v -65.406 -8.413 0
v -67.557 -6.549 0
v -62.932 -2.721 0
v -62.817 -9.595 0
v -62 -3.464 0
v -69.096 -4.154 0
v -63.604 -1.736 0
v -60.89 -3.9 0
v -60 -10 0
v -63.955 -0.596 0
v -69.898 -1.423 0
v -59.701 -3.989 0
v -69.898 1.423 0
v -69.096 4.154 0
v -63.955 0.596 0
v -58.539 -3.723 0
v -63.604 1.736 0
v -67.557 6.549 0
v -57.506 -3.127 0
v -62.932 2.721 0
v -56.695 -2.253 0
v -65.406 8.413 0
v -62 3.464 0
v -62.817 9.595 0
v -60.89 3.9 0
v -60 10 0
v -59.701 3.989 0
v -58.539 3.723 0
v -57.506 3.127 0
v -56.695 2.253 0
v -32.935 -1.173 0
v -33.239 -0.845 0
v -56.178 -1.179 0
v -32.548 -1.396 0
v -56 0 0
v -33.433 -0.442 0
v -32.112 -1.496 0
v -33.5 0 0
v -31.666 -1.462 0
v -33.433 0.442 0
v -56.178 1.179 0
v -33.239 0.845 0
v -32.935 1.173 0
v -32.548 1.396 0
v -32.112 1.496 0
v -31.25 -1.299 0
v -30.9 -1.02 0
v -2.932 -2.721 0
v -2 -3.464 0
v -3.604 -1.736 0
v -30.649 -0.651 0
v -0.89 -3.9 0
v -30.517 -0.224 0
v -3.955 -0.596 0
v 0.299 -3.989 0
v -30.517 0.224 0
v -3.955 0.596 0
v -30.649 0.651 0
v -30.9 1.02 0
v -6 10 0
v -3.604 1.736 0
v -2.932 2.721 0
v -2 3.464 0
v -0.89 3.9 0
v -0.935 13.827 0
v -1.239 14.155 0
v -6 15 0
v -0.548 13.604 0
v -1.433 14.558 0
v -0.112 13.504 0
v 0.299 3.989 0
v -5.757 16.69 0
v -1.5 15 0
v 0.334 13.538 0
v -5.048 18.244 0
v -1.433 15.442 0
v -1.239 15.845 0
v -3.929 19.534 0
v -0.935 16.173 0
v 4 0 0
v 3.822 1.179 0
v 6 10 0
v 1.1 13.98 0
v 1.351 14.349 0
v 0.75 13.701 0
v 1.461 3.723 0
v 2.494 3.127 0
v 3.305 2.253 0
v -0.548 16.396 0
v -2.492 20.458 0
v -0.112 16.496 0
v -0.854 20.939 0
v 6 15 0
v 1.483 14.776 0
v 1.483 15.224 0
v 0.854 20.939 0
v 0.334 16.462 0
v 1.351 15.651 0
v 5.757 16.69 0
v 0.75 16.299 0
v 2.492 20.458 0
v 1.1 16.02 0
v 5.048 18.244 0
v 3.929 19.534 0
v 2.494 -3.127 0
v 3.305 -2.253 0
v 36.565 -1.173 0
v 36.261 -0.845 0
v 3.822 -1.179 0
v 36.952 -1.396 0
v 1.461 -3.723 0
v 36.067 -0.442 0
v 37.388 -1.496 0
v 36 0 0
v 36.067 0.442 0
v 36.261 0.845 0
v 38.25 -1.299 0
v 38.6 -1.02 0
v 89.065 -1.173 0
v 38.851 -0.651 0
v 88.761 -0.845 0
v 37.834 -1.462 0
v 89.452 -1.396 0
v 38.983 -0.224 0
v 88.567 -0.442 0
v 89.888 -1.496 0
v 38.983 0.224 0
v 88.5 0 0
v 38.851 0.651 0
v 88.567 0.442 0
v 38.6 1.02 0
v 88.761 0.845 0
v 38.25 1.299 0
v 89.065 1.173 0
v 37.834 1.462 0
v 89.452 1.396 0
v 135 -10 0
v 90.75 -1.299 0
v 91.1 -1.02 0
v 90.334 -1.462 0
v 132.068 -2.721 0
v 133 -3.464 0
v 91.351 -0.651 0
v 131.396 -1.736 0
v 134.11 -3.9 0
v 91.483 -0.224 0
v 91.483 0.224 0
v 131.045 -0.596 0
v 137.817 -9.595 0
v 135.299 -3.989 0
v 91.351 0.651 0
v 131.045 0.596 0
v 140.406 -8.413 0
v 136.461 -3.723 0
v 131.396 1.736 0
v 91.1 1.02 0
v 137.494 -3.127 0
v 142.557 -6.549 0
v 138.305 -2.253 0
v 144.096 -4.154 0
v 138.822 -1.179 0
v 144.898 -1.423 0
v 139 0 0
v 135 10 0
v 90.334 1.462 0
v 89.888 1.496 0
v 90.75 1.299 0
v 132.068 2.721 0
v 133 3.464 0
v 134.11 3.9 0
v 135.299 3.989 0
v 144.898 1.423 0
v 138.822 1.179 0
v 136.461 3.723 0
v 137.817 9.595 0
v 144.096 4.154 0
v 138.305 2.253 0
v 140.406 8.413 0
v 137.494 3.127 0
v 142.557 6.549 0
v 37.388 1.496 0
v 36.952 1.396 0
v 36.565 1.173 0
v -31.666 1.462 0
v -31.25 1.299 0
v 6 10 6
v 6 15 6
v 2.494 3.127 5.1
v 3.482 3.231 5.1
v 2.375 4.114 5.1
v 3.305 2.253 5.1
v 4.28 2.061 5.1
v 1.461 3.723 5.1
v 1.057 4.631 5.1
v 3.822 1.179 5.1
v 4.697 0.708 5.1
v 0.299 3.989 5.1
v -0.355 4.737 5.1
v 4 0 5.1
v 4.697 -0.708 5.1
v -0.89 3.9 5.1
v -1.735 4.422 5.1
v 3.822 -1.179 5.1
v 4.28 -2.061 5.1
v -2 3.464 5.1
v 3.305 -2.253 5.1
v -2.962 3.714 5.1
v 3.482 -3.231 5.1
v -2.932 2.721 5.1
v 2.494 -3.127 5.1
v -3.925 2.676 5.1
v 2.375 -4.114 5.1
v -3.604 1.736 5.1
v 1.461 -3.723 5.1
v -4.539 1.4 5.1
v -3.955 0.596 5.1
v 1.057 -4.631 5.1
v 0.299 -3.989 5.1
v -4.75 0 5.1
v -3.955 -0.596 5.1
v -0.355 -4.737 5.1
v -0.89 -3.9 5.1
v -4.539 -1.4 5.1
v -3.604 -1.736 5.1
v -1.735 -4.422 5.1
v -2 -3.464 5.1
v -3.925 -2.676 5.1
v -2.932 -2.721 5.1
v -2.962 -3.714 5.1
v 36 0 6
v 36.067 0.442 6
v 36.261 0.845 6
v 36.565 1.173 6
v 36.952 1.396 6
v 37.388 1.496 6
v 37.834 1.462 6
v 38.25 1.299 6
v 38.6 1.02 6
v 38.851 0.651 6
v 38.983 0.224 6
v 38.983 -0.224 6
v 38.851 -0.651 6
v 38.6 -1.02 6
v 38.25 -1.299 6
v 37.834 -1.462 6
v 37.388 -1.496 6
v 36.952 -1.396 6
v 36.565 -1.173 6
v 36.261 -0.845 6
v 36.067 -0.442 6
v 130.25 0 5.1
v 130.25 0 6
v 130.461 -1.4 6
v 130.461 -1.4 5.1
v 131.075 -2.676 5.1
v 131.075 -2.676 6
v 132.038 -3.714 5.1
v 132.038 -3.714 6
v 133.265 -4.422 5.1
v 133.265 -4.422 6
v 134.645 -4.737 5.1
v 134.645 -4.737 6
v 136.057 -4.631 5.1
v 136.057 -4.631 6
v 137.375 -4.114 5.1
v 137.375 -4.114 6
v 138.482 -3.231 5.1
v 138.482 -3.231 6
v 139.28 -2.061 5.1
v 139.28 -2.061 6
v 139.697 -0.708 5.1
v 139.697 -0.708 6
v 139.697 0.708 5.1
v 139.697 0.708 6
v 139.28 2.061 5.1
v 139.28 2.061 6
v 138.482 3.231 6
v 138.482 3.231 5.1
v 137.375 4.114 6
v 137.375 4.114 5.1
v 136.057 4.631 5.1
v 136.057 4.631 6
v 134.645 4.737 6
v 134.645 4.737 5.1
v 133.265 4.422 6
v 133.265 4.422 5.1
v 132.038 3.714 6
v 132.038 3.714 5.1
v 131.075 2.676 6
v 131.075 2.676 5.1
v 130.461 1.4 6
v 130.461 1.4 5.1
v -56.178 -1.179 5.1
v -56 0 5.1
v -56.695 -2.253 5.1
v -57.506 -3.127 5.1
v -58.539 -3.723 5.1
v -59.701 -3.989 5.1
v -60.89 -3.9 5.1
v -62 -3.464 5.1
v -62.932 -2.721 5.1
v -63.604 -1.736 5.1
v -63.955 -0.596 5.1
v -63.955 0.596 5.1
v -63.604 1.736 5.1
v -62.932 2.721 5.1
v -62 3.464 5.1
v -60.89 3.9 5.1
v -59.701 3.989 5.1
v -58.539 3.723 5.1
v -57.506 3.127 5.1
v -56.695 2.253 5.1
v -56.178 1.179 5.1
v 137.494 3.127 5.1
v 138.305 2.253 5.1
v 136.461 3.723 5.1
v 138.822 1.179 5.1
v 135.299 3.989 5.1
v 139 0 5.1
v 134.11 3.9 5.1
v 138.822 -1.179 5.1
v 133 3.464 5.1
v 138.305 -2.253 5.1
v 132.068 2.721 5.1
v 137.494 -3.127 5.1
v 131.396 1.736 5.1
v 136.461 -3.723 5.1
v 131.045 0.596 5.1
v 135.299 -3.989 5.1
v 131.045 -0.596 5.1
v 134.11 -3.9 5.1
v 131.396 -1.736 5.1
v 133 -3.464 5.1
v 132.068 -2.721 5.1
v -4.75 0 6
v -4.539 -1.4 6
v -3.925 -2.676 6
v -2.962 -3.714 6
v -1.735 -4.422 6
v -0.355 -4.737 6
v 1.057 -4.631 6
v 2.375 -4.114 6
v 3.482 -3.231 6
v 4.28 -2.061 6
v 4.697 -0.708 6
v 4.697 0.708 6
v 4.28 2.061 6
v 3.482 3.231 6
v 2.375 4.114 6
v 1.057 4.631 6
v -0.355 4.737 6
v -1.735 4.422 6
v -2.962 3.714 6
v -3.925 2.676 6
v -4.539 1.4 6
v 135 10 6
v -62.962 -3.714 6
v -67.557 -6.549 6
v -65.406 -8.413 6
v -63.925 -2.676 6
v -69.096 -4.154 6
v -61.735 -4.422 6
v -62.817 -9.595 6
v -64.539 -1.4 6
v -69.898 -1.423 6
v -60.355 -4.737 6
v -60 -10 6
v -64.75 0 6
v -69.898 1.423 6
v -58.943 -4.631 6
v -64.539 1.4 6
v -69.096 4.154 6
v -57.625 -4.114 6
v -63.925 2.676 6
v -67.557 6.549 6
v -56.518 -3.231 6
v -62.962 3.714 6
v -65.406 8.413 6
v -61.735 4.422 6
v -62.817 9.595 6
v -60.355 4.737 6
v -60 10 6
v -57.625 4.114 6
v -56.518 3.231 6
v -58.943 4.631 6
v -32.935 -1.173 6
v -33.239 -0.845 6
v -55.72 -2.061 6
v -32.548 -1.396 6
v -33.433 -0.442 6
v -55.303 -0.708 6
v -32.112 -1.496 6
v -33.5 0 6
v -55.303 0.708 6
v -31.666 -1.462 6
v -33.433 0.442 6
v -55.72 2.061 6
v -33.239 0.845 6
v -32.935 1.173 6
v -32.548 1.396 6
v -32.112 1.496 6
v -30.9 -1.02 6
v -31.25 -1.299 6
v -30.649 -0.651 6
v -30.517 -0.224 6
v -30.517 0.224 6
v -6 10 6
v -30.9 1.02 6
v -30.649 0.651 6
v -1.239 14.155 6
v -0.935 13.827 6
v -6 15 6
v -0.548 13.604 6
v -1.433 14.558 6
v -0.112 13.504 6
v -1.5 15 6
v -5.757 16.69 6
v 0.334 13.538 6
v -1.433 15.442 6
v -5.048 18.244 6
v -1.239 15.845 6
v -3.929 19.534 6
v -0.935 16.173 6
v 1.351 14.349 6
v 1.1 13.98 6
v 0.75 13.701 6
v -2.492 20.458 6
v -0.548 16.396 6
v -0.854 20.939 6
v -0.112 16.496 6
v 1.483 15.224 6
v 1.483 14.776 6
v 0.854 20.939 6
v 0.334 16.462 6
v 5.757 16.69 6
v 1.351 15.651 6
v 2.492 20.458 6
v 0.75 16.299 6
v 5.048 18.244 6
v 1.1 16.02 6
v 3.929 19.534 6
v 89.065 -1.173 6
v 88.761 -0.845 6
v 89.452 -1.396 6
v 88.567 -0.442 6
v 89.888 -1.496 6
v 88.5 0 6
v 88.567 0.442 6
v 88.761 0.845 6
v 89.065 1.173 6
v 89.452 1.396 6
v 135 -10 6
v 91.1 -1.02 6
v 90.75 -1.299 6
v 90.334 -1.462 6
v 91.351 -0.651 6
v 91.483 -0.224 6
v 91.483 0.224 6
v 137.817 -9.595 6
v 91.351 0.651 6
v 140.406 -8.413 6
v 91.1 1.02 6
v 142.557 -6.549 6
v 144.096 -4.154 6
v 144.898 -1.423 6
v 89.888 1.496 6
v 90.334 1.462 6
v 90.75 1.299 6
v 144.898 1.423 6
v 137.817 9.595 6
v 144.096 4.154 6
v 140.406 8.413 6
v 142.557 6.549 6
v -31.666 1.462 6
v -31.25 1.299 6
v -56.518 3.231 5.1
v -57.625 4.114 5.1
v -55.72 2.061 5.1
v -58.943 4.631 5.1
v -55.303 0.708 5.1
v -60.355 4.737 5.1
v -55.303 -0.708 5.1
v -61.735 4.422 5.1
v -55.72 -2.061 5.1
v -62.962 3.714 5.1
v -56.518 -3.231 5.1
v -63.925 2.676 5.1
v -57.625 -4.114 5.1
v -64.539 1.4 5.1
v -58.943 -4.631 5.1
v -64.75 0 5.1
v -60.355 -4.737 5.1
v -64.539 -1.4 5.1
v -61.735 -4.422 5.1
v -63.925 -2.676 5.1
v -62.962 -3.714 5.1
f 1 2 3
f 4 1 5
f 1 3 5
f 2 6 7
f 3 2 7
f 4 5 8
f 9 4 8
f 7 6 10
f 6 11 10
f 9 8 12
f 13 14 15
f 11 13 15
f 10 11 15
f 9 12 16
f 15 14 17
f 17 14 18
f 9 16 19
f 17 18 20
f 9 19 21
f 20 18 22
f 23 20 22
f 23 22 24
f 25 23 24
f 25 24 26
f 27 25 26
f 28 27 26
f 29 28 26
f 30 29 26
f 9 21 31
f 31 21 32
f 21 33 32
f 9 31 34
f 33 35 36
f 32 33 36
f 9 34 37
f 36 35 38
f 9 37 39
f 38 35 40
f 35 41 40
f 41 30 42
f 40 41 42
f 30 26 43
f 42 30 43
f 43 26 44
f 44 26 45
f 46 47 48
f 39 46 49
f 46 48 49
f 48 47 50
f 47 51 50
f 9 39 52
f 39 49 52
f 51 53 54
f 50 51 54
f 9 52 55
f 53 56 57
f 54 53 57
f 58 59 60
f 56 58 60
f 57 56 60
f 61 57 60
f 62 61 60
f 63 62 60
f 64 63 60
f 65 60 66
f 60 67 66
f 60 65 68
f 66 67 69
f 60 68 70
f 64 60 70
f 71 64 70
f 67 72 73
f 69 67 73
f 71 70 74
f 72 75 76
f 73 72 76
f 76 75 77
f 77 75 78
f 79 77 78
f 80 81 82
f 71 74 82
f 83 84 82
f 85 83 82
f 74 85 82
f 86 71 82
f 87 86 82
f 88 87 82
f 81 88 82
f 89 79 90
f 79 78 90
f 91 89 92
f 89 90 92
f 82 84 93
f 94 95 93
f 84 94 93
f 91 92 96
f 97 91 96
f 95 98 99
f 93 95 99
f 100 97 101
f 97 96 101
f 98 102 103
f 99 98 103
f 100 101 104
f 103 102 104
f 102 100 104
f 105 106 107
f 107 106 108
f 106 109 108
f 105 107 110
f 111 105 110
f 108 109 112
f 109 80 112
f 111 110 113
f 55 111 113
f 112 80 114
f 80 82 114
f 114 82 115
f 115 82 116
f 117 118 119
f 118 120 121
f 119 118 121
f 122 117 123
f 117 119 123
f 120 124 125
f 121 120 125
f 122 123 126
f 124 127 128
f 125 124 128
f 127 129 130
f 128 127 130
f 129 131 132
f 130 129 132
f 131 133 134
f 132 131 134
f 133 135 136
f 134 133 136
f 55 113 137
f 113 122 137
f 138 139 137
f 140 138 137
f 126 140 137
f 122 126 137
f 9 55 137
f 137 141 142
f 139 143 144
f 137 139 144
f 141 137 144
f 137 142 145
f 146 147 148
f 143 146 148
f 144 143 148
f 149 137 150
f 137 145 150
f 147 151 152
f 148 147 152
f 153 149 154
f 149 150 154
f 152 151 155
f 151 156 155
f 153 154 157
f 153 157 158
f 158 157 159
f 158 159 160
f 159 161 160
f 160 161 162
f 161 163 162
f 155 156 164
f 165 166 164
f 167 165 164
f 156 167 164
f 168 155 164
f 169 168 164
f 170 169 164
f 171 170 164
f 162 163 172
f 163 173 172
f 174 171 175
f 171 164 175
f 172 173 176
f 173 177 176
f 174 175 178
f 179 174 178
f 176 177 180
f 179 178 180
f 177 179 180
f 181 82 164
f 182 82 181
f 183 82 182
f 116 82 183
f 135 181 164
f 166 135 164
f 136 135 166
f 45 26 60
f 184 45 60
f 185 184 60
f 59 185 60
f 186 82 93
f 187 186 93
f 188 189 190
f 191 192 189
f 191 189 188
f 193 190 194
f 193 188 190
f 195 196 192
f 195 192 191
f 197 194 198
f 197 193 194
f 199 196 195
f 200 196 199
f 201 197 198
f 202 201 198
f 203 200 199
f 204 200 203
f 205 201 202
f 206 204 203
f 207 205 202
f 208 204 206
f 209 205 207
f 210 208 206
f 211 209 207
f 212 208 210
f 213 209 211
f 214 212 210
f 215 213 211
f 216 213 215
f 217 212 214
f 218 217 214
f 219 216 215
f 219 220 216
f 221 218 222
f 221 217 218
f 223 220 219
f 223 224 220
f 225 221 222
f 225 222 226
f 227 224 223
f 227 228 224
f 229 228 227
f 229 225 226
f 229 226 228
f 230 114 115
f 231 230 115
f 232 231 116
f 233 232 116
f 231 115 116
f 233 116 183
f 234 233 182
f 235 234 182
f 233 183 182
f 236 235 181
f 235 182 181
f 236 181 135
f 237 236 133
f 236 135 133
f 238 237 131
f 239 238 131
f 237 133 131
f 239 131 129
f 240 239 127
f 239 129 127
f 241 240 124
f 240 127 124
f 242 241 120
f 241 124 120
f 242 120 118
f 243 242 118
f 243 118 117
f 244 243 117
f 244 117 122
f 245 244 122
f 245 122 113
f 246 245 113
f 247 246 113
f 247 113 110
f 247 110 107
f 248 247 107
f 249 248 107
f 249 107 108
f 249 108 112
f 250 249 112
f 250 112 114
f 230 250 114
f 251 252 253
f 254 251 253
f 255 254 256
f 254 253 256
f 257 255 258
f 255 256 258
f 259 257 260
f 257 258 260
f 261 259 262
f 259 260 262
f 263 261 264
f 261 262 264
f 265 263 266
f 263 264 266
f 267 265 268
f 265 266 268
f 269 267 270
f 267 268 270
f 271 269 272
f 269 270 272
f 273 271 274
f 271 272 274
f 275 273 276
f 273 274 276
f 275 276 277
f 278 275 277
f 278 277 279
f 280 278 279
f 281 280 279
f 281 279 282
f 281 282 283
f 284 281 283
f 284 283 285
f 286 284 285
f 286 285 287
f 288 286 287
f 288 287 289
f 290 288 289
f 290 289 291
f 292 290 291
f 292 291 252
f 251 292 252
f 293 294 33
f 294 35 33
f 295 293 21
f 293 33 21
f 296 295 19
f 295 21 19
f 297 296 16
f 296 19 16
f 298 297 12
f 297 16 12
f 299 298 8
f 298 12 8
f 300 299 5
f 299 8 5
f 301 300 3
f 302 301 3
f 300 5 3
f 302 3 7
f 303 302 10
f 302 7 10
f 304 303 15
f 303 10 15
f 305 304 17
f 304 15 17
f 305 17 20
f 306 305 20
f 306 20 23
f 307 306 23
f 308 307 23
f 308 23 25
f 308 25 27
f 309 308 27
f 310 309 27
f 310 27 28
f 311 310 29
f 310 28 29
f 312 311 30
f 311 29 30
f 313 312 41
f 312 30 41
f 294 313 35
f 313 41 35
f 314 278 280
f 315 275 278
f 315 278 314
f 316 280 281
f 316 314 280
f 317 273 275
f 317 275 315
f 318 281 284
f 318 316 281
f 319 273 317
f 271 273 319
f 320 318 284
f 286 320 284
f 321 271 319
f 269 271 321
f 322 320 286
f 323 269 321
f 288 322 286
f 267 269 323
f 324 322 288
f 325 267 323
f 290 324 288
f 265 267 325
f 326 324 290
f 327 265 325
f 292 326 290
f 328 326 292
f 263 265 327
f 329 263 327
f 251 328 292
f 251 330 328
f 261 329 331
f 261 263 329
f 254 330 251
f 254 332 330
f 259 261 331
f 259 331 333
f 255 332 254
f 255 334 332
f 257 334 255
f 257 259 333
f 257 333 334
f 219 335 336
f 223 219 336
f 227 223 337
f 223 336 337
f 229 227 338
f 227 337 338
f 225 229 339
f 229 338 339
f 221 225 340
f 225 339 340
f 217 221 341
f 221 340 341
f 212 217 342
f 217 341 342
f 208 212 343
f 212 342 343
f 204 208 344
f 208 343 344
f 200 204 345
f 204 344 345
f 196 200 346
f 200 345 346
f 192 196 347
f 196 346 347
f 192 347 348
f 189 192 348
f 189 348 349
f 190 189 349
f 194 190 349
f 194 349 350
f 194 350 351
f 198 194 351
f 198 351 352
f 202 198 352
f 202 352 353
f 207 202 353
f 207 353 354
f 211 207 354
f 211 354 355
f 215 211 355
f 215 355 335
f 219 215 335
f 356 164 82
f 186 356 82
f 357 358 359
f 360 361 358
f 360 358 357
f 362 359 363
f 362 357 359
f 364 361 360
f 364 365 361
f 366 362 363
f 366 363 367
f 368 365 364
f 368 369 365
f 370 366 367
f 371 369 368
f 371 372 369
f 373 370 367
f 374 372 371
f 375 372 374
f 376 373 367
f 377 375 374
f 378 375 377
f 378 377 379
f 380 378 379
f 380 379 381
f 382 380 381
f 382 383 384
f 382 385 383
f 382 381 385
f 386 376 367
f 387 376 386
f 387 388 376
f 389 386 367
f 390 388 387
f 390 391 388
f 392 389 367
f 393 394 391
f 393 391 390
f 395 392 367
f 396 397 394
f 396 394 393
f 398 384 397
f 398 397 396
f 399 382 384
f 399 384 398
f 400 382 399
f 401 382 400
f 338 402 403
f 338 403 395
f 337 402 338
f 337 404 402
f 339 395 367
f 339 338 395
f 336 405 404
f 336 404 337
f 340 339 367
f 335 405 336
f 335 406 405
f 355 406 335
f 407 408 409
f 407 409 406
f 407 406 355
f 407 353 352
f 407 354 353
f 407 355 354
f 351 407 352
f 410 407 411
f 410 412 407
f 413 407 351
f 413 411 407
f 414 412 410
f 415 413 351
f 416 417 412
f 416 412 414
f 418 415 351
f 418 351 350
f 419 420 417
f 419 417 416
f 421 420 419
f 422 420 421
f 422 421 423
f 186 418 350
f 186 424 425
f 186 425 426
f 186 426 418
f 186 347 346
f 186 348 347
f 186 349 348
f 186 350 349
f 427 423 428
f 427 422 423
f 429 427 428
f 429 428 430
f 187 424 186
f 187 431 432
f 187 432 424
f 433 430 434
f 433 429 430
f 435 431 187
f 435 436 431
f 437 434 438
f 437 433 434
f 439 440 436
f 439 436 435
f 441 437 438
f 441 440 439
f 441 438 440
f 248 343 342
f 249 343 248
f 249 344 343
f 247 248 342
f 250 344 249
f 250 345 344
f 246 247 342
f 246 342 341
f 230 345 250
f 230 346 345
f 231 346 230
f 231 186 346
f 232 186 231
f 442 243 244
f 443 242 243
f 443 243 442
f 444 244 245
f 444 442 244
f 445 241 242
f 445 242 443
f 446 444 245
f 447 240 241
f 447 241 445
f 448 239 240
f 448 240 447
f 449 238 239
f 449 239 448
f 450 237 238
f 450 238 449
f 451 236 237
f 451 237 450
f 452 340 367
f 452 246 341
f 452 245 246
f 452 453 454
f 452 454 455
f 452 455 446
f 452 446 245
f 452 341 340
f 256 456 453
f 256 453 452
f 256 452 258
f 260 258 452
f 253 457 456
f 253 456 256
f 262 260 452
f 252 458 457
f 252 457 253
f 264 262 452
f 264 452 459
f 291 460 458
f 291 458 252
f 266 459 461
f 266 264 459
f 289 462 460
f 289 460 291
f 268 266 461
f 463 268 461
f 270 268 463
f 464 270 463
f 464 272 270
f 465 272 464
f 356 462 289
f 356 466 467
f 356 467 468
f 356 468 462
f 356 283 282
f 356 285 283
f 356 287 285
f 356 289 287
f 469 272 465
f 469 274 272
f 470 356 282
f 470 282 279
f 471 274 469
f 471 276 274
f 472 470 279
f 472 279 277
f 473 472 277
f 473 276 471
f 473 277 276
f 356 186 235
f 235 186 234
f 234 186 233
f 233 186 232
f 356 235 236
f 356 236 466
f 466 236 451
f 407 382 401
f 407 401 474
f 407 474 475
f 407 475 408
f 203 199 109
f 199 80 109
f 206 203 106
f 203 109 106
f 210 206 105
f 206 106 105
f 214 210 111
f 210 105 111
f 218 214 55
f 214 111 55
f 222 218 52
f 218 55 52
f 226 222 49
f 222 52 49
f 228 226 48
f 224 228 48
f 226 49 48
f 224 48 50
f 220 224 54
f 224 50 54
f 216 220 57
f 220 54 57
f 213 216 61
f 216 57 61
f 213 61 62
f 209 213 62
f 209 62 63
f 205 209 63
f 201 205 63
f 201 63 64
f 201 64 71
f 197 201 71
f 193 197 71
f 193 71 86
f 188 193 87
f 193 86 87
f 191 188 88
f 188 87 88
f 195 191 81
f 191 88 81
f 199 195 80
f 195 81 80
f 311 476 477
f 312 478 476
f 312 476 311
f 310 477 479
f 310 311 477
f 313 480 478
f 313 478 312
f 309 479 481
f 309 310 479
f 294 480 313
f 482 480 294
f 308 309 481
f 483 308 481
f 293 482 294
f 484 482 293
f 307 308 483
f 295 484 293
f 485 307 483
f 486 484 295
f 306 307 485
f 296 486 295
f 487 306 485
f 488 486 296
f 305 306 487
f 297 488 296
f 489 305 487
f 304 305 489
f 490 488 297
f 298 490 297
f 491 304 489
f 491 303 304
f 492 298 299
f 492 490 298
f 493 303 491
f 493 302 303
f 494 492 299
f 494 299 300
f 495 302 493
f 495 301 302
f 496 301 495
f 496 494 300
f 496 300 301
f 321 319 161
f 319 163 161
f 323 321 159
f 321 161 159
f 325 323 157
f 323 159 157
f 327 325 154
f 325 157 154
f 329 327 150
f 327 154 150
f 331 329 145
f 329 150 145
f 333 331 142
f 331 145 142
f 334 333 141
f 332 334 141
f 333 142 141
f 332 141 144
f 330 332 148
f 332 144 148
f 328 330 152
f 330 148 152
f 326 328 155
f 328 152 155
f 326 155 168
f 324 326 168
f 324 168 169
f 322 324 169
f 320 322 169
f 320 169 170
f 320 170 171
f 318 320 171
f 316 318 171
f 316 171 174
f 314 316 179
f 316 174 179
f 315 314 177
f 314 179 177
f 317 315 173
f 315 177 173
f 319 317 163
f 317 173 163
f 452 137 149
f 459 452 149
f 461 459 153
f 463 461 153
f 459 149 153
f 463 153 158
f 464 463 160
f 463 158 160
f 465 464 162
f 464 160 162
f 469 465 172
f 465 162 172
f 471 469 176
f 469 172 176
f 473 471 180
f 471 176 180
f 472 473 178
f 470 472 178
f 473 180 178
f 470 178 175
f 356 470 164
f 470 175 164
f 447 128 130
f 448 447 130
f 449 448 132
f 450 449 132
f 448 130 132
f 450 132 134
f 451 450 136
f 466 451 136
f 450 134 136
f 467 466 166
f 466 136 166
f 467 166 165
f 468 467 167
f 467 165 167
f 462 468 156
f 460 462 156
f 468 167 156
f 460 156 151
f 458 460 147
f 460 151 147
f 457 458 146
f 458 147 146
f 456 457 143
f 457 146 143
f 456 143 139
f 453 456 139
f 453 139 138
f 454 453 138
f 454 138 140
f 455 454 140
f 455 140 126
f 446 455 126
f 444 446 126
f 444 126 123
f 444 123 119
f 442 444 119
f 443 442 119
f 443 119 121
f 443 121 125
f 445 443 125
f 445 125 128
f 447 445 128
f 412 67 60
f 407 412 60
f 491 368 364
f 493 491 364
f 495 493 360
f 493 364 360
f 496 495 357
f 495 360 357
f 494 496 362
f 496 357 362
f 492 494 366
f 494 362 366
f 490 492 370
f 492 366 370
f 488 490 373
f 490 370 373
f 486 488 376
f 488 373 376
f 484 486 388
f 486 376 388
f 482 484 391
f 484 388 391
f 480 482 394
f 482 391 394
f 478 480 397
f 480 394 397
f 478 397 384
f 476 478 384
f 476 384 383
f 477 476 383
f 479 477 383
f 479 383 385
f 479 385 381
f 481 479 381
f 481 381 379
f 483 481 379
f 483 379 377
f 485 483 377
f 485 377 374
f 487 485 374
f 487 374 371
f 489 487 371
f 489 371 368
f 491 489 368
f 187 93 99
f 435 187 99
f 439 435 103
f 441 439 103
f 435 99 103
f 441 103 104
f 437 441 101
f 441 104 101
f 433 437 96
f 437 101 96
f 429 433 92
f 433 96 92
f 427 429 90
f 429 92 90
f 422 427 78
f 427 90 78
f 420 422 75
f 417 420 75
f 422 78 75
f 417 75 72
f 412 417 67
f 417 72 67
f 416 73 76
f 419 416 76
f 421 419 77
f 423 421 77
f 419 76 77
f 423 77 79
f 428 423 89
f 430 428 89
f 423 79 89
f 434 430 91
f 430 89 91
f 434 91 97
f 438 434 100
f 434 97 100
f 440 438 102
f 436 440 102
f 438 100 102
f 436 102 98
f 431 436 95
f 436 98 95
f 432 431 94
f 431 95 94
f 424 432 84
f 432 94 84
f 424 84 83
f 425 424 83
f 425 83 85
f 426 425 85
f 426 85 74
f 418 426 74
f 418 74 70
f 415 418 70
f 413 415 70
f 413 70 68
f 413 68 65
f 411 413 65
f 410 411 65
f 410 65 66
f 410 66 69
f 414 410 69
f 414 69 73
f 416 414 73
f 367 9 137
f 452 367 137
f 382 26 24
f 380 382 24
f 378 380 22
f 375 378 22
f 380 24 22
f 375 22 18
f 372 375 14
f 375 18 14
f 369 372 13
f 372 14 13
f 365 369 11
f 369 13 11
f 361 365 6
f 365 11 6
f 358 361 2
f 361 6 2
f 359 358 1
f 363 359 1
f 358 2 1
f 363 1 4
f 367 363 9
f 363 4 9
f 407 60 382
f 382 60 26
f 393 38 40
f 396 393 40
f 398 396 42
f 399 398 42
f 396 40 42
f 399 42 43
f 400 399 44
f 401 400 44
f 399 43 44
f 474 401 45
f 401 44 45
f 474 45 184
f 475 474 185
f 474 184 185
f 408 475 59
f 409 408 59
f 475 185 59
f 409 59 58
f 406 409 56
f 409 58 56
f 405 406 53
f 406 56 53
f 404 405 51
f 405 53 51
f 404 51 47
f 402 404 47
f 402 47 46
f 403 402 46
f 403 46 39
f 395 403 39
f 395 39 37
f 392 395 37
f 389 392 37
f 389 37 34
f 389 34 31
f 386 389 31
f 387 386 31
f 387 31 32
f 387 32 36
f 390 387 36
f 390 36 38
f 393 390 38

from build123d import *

# Parameters (mm, degrees)
EXTRUDE_1_DEPTH              = 6
HOLE_WIZARD_M5_1_D           = 8
HOLE_WIZARD_M5_1_CBORE_D     = 9.5
HOLE_WIZARD_M5_1_CBORE_DEPTH = 0.9
SKETCH_7_R                   = 1.5
CUT_EXTRUDE_1_DEPTH          = 1
CUT_EXTRUDE_1_DEPTH_BACK     = 7


with BuildPart() as part:
    # 草图1 → 凸台-拉伸1 (new body)
    with BuildSketch(Plane.XY):
        with BuildLine():
            Line((-60, -10), (135, -10))
            ThreePointArc((135, -10), (145, 0), (135, 10))
            Line((135, 10), (6, 10))
            Line((6, 10), (6, 15))
            ThreePointArc((6, 15), (0, 21), (-6, 15))
            Line((-6, 15), (-6, 10))
            Line((-6, 10), (-60, 10))
            ThreePointArc((-60, 10), (-70, 0), (-60, -10))
        make_face()
    extrude(amount=EXTRUDE_1_DEPTH)

    # M5 六角头螺栓的柱形沉头孔1 (through all)
    with Locations(Plane(origin=(0, 0, 6), x_dir=(-1, 0, 0), z_dir=(0, 0, 1))):
        with Locations((-135, 0), (60, 0), (0, 0)):
            CounterBoreHole(HOLE_WIZARD_M5_1_D / 2, HOLE_WIZARD_M5_1_CBORE_D / 2, HOLE_WIZARD_M5_1_CBORE_DEPTH)

    # 草图7 → 切除-拉伸1 (cut, two sides)
    with BuildSketch(Plane(origin=(0, 0, 0), x_dir=(-1, 0, 0), z_dir=(0, 0, -1))) as cut_extrude_1_sk:
        with Locations((-37.5, 0)):
            Circle(SKETCH_7_R)
        with Locations((-90, 0)):
            Circle(SKETCH_7_R)
        with Locations((32, 0)):
            Circle(SKETCH_7_R)
        with Locations((0, 15)):
            Circle(SKETCH_7_R)
    extrude(amount=CUT_EXTRUDE_1_DEPTH, mode=Mode.SUBTRACT)
    extrude(cut_extrude_1_sk.sketch, amount=-CUT_EXTRUDE_1_DEPTH_BACK, mode=Mode.SUBTRACT)


solid = part.part
